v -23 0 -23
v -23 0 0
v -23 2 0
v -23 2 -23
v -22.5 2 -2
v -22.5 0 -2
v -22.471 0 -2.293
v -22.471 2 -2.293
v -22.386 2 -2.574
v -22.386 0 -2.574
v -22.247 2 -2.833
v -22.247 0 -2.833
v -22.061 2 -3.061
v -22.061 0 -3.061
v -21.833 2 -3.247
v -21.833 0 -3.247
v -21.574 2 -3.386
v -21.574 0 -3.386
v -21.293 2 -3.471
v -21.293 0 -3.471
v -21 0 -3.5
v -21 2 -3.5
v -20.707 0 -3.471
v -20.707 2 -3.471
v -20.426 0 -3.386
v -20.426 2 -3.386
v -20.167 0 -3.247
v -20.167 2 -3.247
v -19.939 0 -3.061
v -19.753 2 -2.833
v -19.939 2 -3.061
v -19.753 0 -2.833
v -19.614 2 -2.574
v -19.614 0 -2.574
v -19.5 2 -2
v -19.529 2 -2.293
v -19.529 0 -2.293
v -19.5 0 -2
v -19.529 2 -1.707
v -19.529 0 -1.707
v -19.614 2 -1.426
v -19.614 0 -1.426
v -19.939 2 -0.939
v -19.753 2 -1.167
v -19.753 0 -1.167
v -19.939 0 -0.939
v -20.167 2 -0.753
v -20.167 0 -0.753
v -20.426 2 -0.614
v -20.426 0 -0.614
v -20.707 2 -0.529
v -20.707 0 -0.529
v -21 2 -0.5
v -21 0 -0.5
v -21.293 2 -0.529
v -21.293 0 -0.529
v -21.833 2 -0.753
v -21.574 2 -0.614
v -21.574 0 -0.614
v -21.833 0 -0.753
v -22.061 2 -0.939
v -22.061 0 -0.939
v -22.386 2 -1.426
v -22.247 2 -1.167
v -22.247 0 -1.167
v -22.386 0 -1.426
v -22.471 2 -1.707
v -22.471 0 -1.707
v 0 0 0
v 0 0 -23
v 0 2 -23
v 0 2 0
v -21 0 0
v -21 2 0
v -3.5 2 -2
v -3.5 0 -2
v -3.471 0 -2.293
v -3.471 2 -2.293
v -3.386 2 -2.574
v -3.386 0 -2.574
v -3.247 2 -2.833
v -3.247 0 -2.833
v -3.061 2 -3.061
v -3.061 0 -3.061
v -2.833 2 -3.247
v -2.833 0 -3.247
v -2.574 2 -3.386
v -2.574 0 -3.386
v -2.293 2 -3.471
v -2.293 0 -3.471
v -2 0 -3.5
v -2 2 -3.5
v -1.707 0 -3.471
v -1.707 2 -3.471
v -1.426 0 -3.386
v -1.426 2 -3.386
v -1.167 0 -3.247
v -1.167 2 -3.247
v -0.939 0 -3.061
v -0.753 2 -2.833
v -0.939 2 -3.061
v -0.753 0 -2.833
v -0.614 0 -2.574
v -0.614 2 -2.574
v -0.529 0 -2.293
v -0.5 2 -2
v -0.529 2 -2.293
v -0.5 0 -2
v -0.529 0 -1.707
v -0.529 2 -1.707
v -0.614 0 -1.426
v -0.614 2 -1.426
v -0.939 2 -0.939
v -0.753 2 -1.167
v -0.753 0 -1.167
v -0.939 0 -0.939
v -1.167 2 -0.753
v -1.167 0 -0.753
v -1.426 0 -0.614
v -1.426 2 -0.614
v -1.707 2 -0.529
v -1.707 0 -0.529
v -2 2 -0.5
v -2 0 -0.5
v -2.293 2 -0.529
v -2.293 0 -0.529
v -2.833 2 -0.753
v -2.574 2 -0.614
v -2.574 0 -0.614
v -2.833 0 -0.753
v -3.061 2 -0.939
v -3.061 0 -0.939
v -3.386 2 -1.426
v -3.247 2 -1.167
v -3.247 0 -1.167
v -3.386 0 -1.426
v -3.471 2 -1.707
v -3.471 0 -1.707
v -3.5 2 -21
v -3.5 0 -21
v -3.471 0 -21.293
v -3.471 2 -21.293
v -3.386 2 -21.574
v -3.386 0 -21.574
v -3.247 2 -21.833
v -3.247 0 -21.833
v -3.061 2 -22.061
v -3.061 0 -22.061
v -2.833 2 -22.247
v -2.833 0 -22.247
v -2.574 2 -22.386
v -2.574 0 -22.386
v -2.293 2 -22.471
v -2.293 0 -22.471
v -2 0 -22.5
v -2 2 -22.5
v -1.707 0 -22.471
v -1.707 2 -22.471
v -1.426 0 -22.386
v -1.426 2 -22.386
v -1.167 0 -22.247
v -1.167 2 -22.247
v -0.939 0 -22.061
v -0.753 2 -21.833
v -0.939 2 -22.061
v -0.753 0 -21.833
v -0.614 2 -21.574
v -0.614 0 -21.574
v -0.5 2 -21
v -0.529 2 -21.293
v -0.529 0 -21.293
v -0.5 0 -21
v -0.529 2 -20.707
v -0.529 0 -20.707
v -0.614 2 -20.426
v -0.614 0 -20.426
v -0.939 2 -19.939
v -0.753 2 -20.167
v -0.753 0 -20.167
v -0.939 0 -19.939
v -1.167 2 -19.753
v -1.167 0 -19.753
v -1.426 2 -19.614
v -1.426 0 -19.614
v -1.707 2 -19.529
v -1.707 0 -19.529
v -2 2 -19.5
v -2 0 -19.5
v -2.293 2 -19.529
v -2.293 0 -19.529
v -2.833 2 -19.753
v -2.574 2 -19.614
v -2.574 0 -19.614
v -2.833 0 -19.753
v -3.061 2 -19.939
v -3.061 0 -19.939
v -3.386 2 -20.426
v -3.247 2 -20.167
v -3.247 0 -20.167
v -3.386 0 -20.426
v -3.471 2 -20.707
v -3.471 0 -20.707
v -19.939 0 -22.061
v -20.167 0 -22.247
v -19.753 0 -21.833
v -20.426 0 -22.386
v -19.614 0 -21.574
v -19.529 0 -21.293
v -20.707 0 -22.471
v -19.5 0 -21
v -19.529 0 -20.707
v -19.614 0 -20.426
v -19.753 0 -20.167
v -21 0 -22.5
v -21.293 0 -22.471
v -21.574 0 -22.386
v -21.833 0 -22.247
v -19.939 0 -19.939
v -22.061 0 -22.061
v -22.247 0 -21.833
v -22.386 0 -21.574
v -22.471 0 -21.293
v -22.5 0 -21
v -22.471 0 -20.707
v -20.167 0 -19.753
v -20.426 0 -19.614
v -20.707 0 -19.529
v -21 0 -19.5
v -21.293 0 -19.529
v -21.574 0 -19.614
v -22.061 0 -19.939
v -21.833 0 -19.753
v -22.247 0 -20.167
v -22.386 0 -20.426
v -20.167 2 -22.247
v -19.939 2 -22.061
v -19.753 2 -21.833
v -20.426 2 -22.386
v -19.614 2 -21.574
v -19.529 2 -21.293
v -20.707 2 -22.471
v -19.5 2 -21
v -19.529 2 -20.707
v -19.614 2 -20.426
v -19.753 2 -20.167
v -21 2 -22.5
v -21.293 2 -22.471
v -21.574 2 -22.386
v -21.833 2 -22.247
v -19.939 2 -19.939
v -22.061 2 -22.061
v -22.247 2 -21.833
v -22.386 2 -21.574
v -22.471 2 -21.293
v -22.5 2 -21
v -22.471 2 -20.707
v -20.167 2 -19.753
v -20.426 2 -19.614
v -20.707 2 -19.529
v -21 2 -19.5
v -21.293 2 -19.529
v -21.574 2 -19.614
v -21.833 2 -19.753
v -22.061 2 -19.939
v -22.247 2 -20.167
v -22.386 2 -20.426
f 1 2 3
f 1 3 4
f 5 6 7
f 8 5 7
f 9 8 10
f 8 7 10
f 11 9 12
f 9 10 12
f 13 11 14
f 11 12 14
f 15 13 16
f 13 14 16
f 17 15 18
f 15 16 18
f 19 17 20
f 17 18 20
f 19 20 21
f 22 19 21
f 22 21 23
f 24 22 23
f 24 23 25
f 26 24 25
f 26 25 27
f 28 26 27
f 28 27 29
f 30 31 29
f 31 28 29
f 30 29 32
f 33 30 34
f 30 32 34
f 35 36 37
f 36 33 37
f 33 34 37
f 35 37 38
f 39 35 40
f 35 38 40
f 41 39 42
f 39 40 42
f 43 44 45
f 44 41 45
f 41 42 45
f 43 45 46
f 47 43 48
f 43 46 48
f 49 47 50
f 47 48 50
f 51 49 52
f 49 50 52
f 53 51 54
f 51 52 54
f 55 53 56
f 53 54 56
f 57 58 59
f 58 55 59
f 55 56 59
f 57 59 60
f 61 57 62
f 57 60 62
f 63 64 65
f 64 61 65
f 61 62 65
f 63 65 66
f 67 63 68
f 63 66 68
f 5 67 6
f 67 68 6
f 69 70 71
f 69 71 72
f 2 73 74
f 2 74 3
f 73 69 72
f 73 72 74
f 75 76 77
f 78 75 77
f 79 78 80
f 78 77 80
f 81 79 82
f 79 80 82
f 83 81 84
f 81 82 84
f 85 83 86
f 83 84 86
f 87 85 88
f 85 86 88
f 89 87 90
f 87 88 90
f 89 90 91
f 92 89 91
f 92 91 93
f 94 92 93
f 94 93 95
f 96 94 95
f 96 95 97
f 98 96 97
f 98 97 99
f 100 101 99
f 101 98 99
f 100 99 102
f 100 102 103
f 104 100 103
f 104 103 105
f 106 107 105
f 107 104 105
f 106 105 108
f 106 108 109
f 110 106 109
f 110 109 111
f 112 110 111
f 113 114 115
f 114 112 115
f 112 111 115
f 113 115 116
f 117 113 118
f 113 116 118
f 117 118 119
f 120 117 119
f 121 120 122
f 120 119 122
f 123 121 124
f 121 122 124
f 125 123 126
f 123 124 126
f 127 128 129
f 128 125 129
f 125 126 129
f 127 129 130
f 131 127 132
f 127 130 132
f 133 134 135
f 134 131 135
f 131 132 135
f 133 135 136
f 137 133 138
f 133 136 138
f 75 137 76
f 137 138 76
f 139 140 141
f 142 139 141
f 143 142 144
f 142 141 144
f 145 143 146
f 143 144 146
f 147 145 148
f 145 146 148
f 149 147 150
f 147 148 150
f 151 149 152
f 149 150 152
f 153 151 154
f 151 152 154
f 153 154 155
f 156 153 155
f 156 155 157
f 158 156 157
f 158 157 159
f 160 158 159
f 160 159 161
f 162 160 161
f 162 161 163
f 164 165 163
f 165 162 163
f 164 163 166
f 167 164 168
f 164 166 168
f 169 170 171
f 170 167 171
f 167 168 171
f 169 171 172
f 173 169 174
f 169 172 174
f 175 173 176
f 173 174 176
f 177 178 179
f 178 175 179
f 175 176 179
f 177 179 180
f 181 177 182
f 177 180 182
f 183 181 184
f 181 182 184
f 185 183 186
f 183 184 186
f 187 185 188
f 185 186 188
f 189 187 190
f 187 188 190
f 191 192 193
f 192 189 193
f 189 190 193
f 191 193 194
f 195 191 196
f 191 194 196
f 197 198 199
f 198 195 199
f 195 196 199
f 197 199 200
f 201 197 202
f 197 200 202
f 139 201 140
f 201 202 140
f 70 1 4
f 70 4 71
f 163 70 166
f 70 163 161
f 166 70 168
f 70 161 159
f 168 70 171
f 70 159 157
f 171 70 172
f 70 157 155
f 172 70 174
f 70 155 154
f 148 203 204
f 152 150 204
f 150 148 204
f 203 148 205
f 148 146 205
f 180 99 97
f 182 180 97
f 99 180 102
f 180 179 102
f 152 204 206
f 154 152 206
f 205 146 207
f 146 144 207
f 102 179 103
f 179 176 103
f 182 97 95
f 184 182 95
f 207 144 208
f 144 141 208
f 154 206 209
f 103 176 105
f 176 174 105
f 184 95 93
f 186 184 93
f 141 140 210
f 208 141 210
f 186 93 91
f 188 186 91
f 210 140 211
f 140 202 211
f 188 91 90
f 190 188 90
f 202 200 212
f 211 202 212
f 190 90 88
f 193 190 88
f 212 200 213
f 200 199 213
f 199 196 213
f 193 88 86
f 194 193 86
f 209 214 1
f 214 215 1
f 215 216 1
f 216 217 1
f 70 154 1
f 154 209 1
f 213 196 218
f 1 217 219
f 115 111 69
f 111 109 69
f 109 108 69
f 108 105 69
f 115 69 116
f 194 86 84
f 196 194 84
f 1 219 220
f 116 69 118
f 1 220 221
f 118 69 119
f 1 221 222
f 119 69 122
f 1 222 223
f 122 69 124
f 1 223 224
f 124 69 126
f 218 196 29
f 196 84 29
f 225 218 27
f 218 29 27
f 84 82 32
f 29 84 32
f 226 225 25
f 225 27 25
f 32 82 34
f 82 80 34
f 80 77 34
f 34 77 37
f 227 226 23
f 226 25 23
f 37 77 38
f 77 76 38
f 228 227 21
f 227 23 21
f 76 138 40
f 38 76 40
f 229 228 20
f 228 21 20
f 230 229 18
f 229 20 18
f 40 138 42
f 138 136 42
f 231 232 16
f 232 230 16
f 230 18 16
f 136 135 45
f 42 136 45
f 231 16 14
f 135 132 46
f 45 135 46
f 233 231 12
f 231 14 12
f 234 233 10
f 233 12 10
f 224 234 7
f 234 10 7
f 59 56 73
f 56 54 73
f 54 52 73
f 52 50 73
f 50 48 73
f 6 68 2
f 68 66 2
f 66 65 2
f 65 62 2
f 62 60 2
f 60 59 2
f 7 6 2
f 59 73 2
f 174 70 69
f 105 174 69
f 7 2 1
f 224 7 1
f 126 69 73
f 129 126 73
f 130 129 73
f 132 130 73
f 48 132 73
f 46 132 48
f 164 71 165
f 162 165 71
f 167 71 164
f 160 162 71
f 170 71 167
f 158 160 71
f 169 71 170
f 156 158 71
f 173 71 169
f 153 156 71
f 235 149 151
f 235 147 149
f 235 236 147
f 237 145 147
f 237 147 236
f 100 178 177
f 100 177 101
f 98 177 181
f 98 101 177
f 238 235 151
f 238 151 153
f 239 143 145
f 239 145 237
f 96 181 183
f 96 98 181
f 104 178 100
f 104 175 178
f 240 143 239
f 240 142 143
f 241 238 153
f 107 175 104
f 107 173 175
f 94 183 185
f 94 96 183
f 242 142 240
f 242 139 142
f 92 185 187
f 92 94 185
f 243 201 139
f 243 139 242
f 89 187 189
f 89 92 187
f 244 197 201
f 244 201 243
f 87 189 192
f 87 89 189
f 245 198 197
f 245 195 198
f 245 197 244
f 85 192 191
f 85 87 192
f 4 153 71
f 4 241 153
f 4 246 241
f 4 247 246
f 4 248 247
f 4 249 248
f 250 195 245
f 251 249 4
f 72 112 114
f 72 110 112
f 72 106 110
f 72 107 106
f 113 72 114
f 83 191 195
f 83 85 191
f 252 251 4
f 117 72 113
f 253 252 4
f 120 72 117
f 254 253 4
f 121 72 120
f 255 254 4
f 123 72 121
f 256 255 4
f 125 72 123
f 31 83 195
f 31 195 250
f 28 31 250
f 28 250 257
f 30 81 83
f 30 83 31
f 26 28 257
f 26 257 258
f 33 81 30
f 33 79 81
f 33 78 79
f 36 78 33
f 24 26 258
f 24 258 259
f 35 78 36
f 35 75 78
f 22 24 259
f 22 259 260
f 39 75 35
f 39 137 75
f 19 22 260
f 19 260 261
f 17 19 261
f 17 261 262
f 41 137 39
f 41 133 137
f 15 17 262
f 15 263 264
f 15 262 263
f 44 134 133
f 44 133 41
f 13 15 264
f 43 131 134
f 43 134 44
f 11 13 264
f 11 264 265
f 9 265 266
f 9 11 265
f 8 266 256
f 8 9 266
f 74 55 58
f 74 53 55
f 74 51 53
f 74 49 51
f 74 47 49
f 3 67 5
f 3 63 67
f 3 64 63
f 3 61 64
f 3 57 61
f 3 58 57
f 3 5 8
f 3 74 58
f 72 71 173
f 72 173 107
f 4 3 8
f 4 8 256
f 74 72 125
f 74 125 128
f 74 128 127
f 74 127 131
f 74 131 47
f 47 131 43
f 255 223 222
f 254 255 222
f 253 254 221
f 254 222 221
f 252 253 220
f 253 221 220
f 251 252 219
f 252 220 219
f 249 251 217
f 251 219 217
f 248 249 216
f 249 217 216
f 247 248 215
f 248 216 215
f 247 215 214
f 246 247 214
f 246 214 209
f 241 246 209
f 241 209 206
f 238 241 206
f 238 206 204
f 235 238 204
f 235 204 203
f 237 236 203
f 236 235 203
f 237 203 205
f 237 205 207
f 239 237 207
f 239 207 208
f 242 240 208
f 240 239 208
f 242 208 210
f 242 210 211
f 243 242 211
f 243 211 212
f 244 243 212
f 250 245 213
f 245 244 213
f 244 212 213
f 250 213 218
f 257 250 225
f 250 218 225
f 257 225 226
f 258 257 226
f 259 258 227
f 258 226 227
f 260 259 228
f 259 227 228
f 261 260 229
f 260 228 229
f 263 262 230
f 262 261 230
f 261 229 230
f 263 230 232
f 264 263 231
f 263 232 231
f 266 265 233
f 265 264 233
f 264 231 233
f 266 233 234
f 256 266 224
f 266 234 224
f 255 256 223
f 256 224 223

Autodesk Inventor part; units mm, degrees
ref_plane "YZ Plane" through (0, 0, 0) normal (1, 0, 0) x (0, 1, 0)
ref_plane "XZ Plane" through (0, 0, 0) normal (0, 1, 0) x (-1, 0, 0)
ref_plane "XY Plane" through (0, 0, 0) normal (0, 0, 1) x (1, 0, 0)
sketch "Sketch1" plane through (0, 0, 0) normal (0, 1, 0) x (-1, 0, 0)
  line L0 (0, 0) -> (23, 0)
  line L1 (23, 0) -> (23, -23)
  line L2 (23, -23) -> (0, -23)
  line L3 (0, -23) -> (0, 0)
  line L4 (23, 0) -> (21, 0)
  circle A0 centre (21, -2) radius 1.5
  circle A1 centre (2, -2) radius 1.5
  circle A2 centre (21, -21) radius 1.5
  circle A3 centre (2, -21) radius 1.5
  dimension "d0" = 23
  dimension "d1" = 23
  dimension "d4" = 3
extrude "Extrusion1" add sketch "Sketch1" along normal blind 2
properties part number "Mag_Sensor"
